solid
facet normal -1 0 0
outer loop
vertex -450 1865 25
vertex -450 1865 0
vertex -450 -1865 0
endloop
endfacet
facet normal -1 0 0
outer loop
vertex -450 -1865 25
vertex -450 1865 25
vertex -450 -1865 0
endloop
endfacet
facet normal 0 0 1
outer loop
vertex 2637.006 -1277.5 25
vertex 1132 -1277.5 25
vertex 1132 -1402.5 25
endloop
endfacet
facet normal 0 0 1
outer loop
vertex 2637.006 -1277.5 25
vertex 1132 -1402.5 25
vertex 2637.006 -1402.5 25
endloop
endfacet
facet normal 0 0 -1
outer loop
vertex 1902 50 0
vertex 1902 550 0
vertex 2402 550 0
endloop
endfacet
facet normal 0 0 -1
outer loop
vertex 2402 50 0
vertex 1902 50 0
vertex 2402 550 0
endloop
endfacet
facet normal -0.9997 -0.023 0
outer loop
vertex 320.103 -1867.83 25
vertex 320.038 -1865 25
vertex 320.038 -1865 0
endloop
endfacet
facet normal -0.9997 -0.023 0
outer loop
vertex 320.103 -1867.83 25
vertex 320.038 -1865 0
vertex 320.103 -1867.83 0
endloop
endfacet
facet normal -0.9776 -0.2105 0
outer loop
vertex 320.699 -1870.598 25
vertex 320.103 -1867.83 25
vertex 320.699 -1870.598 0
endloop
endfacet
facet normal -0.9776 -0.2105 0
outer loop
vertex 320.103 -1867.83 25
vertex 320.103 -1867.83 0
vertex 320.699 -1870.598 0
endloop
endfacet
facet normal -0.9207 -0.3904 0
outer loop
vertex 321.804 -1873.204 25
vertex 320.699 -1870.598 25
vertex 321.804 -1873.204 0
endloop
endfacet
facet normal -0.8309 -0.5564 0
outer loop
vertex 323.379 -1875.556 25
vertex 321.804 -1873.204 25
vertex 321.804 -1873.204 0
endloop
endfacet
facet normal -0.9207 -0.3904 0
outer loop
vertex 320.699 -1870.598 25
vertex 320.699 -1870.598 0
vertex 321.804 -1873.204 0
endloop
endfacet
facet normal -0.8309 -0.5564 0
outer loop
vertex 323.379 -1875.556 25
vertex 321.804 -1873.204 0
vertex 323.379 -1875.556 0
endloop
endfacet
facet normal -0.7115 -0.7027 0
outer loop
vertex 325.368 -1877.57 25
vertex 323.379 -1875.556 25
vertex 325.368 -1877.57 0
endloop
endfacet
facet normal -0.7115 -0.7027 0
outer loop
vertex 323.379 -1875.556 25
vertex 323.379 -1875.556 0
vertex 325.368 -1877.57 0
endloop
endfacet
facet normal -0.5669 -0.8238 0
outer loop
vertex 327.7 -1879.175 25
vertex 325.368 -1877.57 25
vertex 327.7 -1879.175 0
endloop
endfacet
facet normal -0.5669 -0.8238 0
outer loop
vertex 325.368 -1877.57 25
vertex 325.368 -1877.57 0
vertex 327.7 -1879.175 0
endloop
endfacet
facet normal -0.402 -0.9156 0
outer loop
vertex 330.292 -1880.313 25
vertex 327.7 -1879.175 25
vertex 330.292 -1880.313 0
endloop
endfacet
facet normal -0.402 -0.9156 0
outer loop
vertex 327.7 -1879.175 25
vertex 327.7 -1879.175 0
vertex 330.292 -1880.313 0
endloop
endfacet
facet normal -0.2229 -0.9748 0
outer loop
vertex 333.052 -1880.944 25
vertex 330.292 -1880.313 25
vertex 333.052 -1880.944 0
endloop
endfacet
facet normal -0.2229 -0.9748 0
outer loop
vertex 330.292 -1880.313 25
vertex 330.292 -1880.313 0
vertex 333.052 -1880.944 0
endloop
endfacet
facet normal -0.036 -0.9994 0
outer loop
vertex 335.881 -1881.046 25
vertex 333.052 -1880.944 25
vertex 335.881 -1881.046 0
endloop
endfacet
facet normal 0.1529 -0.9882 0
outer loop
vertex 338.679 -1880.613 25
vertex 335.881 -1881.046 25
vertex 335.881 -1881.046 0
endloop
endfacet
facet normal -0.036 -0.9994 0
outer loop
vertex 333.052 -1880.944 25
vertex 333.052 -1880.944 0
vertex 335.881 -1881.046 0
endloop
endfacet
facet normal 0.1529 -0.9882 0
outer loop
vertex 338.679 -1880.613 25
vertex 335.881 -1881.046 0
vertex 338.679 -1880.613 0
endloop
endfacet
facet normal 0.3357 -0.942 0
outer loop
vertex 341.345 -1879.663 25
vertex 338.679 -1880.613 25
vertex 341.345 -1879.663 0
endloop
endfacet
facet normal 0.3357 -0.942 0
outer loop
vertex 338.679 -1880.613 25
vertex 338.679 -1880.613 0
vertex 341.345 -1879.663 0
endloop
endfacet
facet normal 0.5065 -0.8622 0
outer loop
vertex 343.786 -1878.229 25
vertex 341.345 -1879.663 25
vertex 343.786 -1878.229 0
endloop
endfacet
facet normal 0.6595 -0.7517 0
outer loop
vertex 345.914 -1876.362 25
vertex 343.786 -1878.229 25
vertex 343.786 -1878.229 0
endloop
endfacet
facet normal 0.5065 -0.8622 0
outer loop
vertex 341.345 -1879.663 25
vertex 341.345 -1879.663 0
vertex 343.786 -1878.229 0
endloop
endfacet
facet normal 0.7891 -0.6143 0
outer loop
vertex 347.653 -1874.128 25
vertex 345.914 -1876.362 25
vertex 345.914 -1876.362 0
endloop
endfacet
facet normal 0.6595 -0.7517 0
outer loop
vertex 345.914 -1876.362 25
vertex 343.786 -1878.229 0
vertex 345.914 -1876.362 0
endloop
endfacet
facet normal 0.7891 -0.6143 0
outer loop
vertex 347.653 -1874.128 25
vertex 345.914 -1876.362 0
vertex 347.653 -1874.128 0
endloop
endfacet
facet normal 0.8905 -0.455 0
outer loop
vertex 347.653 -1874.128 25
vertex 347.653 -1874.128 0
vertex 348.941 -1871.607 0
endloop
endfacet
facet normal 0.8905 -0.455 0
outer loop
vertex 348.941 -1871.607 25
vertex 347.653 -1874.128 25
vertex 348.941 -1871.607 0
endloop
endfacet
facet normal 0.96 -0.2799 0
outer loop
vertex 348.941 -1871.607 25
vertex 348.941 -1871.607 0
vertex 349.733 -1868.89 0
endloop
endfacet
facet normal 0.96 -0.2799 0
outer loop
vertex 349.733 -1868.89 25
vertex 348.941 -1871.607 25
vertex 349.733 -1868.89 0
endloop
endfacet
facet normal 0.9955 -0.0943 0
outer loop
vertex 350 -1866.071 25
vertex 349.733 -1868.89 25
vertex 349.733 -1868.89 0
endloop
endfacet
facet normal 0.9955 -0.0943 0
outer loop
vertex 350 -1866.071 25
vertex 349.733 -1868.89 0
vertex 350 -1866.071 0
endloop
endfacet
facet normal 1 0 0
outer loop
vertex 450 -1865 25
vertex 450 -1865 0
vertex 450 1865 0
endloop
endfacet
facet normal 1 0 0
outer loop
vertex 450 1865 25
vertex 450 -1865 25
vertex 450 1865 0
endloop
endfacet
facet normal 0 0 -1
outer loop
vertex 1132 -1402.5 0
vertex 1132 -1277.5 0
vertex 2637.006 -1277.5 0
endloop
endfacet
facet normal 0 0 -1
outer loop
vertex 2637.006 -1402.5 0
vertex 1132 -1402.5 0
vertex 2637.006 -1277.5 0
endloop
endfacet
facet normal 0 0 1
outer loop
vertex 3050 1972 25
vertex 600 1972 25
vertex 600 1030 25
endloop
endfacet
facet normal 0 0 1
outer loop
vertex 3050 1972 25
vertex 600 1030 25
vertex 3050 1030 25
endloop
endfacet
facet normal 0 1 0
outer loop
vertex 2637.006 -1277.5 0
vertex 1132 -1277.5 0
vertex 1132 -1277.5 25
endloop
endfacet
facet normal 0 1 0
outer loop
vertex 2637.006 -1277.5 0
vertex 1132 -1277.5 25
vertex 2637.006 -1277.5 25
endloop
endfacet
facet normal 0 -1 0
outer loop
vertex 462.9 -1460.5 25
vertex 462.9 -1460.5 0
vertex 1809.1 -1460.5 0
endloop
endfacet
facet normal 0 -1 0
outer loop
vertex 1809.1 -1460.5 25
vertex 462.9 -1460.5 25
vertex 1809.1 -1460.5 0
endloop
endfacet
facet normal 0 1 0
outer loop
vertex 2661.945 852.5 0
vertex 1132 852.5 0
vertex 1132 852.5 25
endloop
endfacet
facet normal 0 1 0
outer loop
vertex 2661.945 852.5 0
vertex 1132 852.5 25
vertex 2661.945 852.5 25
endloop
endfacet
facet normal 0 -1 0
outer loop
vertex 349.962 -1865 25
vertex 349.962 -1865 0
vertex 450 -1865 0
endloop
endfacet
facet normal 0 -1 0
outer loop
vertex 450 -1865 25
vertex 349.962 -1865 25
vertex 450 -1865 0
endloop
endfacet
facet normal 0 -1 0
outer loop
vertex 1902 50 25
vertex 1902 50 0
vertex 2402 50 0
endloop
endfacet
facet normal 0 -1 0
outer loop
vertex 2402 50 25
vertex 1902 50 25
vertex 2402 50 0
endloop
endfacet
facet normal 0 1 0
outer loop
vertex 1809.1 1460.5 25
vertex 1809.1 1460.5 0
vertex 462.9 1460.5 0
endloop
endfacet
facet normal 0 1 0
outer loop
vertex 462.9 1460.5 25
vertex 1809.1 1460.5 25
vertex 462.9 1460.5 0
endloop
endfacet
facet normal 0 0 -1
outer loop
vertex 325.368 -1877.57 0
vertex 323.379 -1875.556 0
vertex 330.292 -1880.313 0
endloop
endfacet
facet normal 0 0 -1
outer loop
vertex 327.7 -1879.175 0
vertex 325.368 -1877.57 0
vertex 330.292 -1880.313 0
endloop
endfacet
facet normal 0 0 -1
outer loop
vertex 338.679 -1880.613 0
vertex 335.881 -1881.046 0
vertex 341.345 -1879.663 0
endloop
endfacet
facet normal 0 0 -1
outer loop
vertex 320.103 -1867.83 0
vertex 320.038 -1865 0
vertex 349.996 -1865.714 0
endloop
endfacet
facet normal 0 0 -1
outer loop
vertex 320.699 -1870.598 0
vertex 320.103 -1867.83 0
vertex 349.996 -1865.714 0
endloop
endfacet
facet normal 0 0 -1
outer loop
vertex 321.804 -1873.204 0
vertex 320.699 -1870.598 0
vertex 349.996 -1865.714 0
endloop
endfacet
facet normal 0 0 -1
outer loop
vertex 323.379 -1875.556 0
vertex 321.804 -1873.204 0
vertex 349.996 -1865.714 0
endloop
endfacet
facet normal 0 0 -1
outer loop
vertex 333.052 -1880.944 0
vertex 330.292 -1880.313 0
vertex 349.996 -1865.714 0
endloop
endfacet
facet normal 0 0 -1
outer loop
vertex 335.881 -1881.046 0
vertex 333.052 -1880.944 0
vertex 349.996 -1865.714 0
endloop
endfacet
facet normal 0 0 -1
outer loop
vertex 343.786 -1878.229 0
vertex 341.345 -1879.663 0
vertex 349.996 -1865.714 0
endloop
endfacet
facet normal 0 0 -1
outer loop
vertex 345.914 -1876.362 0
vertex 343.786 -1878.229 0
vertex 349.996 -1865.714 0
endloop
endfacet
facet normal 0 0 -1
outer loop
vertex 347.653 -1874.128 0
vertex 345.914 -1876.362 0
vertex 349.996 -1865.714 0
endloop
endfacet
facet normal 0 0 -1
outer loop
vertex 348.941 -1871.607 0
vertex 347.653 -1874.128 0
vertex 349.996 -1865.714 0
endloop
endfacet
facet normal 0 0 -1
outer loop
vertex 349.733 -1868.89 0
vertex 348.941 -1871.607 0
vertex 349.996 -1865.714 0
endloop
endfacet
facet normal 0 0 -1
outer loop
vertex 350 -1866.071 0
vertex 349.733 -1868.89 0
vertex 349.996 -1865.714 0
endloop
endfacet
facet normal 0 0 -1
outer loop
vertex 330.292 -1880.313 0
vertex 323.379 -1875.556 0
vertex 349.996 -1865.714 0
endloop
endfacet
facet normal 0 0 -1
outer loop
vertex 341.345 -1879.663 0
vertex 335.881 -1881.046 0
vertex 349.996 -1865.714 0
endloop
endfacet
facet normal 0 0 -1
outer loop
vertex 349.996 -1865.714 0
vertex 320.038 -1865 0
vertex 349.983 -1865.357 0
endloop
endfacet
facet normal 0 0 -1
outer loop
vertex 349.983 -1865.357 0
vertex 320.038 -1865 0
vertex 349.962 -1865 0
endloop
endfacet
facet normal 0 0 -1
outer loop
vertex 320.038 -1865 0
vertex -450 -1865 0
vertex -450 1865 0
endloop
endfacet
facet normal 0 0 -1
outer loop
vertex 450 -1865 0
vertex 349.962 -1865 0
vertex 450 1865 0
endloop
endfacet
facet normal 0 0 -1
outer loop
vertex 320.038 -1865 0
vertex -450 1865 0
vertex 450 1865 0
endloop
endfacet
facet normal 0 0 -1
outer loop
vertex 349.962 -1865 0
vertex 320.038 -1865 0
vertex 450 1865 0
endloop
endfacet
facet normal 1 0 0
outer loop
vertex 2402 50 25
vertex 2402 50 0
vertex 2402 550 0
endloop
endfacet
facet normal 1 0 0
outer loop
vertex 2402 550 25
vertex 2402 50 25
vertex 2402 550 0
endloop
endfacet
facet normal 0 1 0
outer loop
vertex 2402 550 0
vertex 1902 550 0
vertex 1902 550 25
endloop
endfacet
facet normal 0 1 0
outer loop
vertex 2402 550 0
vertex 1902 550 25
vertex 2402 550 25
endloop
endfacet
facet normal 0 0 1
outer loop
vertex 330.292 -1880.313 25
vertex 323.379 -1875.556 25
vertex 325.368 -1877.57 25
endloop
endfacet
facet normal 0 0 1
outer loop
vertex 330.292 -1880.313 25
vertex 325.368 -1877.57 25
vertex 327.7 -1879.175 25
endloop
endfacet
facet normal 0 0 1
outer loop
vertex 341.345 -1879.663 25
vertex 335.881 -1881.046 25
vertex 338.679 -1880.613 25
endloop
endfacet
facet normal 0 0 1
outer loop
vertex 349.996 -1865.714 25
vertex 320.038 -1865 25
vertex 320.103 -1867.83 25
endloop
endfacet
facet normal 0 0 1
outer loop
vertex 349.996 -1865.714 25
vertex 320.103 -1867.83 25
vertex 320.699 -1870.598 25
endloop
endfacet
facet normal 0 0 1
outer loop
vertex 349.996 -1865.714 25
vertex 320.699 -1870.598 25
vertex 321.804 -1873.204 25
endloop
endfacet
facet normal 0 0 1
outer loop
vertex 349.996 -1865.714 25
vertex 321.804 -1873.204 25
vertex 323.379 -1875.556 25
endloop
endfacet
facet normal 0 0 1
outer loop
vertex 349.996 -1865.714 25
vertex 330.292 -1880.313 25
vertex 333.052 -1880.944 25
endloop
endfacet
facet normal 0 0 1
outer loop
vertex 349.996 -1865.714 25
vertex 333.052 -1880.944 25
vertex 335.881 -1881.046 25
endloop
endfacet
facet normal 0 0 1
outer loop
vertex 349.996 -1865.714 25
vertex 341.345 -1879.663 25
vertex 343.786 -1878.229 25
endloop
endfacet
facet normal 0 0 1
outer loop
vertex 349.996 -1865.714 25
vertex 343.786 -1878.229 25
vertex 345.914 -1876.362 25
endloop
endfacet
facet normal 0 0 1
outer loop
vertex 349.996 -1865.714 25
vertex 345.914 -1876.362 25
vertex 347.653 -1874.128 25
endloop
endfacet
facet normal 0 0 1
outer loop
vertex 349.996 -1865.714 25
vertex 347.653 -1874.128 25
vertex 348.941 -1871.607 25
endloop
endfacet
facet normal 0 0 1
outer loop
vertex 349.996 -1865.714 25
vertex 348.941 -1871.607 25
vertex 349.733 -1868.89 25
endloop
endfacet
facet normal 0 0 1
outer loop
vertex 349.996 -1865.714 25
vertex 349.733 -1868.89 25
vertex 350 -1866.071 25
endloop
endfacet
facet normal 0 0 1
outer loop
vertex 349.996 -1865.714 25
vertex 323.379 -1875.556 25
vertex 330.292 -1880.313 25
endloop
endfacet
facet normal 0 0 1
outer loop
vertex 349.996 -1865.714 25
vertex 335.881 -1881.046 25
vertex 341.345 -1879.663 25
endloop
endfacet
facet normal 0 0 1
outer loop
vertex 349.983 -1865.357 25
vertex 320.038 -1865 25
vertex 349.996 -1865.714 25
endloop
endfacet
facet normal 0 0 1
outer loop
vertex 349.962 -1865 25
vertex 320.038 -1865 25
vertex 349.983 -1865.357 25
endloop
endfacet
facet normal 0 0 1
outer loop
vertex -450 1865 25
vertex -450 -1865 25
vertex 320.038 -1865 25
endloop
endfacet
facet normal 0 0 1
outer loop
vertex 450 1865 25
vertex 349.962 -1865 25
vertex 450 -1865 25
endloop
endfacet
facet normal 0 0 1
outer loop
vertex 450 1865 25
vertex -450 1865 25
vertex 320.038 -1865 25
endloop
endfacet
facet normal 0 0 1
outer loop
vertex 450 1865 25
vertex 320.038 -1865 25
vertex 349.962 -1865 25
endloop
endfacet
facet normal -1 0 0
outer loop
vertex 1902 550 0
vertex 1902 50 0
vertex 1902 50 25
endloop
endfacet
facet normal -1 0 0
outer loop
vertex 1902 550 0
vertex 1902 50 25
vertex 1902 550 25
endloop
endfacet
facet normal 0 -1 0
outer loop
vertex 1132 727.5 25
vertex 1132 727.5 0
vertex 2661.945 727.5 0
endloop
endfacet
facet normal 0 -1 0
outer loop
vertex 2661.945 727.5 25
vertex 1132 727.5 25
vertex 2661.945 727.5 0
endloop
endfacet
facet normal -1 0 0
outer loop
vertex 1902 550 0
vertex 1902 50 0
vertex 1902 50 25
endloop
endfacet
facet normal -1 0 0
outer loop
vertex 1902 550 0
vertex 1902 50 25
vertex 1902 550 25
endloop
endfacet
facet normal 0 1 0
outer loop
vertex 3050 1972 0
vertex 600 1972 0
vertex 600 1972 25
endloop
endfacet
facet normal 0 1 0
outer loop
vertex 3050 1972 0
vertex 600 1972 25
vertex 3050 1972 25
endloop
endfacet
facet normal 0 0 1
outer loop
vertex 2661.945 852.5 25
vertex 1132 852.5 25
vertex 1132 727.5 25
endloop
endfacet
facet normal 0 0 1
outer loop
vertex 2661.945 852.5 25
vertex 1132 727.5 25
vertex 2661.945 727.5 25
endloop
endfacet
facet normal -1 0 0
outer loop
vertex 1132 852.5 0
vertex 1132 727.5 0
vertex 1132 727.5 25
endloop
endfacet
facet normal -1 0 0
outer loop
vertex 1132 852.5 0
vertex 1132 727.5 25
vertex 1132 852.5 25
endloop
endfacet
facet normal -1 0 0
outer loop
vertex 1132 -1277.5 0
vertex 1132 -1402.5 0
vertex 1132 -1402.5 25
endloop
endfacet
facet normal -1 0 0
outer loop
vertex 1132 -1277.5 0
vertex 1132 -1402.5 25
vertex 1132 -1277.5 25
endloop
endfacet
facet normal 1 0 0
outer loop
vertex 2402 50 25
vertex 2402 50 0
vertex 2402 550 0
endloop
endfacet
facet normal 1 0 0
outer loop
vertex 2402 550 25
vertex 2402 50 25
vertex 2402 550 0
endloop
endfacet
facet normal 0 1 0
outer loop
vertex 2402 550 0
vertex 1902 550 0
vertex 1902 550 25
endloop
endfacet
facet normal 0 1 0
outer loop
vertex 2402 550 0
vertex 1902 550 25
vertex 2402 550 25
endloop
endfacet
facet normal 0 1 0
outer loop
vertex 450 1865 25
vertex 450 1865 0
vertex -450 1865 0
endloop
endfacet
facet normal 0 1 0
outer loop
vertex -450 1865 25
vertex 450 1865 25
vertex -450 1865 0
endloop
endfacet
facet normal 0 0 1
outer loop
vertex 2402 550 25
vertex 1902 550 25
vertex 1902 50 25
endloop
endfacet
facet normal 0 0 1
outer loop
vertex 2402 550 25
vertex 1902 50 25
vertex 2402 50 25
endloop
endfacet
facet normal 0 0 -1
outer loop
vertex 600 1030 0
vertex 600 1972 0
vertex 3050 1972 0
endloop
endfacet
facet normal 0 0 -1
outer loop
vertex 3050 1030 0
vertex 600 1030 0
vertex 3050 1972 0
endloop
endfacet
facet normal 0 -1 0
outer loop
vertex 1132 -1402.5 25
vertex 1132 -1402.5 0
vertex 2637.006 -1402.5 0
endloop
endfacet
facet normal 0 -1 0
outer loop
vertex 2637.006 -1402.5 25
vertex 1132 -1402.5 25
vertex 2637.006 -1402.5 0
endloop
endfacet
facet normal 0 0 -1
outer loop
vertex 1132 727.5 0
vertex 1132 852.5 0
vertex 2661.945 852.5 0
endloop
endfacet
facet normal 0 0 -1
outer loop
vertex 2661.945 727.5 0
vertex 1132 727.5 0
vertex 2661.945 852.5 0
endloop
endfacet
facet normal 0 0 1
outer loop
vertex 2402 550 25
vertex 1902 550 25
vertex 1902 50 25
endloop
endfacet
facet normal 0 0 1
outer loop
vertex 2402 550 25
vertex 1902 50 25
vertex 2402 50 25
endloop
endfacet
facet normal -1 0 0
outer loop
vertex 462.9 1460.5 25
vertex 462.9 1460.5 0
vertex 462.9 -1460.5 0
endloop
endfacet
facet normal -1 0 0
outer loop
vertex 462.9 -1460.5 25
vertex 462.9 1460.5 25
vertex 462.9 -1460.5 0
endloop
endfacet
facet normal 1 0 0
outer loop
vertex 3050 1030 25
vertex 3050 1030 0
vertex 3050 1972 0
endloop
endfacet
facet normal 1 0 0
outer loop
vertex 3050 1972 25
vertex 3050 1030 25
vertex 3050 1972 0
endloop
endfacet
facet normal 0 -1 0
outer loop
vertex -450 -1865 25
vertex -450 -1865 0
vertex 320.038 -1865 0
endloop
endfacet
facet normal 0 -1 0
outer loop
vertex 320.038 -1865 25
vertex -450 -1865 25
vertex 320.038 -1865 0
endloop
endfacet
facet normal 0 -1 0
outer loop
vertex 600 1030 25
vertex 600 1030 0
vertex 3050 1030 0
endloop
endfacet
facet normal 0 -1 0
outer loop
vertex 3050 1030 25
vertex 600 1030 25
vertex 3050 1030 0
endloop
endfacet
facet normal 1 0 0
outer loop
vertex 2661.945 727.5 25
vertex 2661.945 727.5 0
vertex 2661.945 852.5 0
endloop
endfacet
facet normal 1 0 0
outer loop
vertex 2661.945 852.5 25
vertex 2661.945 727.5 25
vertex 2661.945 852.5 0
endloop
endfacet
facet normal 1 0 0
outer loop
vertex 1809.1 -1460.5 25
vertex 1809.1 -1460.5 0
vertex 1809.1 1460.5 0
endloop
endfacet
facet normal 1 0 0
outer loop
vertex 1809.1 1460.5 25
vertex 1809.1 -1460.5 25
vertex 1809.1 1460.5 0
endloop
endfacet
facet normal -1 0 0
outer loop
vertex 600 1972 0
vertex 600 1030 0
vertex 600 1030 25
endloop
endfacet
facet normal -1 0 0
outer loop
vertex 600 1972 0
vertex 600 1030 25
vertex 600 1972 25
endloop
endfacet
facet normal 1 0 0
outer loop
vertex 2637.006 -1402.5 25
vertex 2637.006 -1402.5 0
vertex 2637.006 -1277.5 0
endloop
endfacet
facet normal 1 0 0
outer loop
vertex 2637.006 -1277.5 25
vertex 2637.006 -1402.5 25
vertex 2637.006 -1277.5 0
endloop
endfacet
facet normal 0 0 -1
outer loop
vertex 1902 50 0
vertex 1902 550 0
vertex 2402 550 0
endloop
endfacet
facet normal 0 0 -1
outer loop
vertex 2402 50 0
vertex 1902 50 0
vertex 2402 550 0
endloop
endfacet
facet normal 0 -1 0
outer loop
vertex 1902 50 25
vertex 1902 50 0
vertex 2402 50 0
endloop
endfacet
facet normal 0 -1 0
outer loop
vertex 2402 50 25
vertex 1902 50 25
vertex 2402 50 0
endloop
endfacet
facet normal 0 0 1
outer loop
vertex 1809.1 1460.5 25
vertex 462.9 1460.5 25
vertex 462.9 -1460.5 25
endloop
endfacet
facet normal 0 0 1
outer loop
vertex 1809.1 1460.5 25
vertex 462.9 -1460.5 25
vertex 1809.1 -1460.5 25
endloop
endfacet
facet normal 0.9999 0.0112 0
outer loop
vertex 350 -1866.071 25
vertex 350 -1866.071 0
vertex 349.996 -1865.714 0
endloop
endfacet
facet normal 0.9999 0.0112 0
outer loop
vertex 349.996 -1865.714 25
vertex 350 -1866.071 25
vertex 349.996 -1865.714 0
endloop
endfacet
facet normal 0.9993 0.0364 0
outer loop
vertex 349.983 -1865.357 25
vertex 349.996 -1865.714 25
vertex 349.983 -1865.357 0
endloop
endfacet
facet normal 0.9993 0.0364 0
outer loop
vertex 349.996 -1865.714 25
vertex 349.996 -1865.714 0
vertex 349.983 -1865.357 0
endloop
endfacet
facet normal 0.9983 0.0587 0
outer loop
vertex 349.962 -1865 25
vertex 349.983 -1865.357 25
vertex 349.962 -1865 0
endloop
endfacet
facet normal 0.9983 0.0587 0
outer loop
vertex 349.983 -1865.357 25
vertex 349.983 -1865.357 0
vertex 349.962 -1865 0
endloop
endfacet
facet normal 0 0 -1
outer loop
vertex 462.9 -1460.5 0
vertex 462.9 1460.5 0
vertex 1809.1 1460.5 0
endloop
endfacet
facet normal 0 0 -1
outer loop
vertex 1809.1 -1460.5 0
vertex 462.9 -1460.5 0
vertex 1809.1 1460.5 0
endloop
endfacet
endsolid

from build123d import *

# Parameters (mm, degrees)
F2_DEPTH = 25
F0_W     = 500
F0_H     = 500
F1_W     = 2450
F1_H     = 942
F1_W_2   = 1505.0055859834
F1_H_2   = 125
F1_R     = 15
F1_W_3   = 1529.9445597557
F1_W_4   = 500
F1_H_3   = 500


with BuildPart() as f2:
    # F0 (on Top) → F2 (new body)
    with BuildSketch(Plane.XY):
        Polygon((462.9, 1460.5), (462.9, 0), (462.9, -1460.5), (1809.1, -1460.5), (1809.1, 1460.5), align=None)
    extrude(amount=F2_DEPTH)


with BuildPart() as f2b:
    # F0 (on Top) → F2, piece 2 (new body)
    with BuildSketch(Plane.XY):
        with Locations((2152, 300)):
            Rectangle(F0_W, F0_H)
    extrude(amount=F2_DEPTH)


with BuildPart() as f2c:
    # F1 (on Top) → F2, piece 3 (new body)
    with BuildSketch(Plane.XY):
        with Locations((1825, 1501)):
            Rectangle(F1_W, F1_H)
    extrude(amount=F2_DEPTH)


with BuildPart() as f2d:
    # F1 (on Top) → F2, piece 4 (new body)
    with BuildSketch(Plane.XY):
        with BuildLine():
            Line((349.9616857612, -1865), (450, -1865))
            Line((450, -1865), (450, 1865))
            Line((450, 1865), (-450, 1865))
            Line((-450, 1865), (-450, 0))
            Line((-450, 0), (-450, -1865))
            Line((-450, -1865), (320.0383142388, -1865))
            ThreePointArc((320.0383142388, -1865), (335, -1851.0714285714), (349.9616857612, -1865))
        make_face()
        with BuildLine():
            ThreePointArc((350, -1866.0714285714), (349.99041838, -1865.5353718663), (349.9616857612, -1865))
            Line((349.9616857612, -1865), (320.0383142388, -1865))
            ThreePointArc((320.0383142388, -1865), (334.4639432948, -1881.0618469515), (350, -1866.0714285714))
        make_face()
        with BuildLine():
            Line((320.0383142388, -1865), (349.9616857612, -1865))
            ThreePointArc((349.9616857612, -1865), (335, -1851.0714285714), (320.0383142388, -1865))
        make_face()
    extrude(amount=F2_DEPTH)


with BuildPart() as f2e:
    # F1 (on Top) → F2, piece 5 (new body)
    with BuildSketch(Plane.XY):
        with Locations((1884.5027929917, -1340)):
            Rectangle(F1_W_2, F1_H_2)
        with Locations((1202, -1340)):
            Circle(F1_R, mode=Mode.SUBTRACT)
        with Locations((1202, -1340)):
            Circle(F1_R)
    extrude(amount=F2_DEPTH)


with BuildPart() as f2f:
    # F1 (on Top) → F2, piece 6 (new body)
    with BuildSketch(Plane.XY):
        with Locations((1896.9722798778, 790)):
            Rectangle(F1_W_3, F1_H_2)
        with Locations((1202, 790)):
            Circle(F1_R, mode=Mode.SUBTRACT)
        with Locations((1202, 790)):
            Circle(F1_R)
    extrude(amount=F2_DEPTH)


with BuildPart() as f2g:
    # F1 (on Top) → F2, piece 7 (new body)
    with BuildSketch(Plane.XY):
        with Locations((2152, 300)):
            Rectangle(F1_W_4, F1_H_3)
    extrude(amount=F2_DEPTH)


solid = Compound([f2.part, f2b.part, f2c.part, f2d.part, f2e.part, f2f.part, f2g.part])
